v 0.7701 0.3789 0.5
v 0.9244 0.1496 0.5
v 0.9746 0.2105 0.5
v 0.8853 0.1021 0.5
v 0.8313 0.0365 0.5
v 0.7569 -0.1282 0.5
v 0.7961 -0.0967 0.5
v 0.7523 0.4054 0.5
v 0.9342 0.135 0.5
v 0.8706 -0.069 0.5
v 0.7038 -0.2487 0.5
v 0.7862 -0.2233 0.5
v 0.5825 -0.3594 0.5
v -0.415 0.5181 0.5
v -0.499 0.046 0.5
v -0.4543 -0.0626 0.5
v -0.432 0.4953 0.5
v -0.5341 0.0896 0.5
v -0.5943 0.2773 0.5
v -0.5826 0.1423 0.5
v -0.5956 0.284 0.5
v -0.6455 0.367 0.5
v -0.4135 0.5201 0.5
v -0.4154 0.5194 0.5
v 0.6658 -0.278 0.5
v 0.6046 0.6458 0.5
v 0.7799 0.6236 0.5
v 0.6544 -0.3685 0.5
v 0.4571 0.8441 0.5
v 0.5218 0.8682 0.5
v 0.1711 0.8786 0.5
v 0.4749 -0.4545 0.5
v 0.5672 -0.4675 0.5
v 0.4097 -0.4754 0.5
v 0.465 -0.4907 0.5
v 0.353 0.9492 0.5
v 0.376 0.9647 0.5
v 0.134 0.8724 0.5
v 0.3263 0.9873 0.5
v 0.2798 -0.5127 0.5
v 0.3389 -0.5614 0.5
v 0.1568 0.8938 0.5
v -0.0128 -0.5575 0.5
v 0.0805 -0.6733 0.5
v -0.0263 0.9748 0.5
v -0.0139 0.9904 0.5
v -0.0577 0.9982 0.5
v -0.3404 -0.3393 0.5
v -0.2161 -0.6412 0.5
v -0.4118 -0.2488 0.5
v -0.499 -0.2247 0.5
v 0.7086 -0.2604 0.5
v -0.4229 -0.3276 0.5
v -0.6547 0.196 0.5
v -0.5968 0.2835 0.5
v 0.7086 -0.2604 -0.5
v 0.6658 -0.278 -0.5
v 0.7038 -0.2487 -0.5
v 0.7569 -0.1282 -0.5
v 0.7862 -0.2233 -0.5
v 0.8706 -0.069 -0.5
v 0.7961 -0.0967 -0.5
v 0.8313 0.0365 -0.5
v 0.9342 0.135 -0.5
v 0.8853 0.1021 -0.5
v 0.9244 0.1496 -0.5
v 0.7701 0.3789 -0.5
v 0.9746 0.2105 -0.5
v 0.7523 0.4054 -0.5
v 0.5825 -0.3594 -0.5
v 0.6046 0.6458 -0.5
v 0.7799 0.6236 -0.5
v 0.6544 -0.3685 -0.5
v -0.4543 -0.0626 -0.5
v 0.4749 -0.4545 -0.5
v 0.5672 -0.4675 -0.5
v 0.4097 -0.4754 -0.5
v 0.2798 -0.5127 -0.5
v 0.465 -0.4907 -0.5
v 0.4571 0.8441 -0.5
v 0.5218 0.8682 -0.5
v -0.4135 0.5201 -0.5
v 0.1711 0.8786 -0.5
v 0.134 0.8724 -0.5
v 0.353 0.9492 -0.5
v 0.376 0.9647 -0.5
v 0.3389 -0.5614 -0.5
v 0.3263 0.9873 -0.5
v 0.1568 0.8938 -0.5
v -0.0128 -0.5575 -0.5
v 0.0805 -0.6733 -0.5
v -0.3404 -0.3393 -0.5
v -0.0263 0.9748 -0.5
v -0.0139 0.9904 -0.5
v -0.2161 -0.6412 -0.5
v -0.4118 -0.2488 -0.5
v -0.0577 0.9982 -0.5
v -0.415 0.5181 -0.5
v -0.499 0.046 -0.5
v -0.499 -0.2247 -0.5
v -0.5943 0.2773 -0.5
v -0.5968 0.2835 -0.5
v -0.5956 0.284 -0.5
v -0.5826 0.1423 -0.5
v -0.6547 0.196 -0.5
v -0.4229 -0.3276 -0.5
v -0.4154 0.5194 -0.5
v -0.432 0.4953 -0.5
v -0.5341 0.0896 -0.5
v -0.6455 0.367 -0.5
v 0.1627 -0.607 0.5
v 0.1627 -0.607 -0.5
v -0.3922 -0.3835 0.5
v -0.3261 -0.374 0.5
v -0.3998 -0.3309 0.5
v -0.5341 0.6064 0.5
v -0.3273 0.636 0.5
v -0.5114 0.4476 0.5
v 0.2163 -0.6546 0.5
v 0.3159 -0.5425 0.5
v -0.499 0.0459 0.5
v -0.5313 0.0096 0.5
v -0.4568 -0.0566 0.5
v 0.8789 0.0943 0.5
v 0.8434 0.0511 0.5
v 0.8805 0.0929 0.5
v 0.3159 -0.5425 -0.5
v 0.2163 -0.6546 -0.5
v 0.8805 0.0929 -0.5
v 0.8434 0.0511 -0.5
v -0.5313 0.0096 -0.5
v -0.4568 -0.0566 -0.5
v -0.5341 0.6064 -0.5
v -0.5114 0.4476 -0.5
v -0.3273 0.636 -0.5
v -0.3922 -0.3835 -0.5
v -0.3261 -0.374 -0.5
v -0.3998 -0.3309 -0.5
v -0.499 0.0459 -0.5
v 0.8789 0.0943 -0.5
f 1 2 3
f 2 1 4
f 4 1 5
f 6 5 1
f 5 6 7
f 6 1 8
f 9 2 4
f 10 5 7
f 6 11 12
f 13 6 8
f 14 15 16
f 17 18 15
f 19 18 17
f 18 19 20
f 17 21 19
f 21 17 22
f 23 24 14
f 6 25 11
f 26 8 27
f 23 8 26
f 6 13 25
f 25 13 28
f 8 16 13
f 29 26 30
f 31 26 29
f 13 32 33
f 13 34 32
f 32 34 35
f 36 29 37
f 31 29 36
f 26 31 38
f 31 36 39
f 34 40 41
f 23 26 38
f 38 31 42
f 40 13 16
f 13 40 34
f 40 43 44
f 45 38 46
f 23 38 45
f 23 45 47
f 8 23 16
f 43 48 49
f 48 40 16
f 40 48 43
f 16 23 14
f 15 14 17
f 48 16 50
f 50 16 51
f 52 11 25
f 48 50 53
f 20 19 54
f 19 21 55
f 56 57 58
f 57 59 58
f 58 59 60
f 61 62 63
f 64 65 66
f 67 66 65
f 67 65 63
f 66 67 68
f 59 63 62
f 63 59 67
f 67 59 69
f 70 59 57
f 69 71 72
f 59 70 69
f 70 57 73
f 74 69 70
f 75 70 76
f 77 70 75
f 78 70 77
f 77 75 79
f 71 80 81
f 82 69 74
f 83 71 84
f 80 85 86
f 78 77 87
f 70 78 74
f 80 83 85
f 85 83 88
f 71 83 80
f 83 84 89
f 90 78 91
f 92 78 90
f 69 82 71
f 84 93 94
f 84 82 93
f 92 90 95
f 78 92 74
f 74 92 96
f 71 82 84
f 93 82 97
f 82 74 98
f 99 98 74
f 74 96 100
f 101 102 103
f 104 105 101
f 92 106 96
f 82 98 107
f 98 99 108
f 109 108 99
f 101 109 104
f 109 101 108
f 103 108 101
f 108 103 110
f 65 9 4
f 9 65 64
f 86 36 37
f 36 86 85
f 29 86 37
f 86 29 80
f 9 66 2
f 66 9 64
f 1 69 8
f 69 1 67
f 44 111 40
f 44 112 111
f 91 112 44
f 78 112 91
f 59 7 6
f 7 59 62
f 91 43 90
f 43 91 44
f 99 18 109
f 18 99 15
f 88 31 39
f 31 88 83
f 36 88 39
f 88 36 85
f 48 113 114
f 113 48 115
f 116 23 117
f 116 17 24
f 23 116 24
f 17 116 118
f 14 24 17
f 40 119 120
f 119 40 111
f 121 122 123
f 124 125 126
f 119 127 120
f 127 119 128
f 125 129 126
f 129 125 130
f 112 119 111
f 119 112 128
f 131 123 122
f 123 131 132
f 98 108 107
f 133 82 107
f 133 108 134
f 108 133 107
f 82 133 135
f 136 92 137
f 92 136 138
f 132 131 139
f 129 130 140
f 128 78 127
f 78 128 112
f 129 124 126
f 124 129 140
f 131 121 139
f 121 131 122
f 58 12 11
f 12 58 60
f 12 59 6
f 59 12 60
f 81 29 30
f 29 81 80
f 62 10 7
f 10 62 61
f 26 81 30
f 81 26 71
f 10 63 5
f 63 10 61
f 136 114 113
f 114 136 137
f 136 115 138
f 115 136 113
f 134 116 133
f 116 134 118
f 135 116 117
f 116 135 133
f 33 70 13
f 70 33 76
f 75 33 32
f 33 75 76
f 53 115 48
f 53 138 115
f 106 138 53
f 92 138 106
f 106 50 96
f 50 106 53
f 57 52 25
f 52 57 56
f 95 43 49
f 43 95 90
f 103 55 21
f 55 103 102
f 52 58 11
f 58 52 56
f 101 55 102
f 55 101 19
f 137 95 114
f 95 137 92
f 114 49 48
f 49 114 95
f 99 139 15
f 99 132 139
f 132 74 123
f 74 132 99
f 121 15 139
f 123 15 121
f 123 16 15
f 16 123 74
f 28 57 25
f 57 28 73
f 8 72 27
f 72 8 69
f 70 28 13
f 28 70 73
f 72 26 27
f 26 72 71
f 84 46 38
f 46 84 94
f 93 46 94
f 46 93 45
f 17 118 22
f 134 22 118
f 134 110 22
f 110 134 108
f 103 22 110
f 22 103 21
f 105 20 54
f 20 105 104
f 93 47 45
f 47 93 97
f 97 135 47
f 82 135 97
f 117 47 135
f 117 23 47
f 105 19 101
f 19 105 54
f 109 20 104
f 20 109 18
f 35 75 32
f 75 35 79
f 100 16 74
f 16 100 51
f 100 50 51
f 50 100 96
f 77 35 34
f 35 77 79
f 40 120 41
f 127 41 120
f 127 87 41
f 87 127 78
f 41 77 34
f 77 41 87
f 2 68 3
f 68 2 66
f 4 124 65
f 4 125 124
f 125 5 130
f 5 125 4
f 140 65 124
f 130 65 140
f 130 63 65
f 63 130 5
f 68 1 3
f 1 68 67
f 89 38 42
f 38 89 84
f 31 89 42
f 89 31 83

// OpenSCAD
seed = 0;
n = 20;
alphas = rands(0,360.0,n,seed);
off_x = rands(0,0.3,n);
off_y = rands(0,0.3,n);
union() {
   for(i=[0:n-1])
      translate([off_x[i], off_y[i], 0.0])
         rotate(alphas[i])
            cube(center=true);
}
